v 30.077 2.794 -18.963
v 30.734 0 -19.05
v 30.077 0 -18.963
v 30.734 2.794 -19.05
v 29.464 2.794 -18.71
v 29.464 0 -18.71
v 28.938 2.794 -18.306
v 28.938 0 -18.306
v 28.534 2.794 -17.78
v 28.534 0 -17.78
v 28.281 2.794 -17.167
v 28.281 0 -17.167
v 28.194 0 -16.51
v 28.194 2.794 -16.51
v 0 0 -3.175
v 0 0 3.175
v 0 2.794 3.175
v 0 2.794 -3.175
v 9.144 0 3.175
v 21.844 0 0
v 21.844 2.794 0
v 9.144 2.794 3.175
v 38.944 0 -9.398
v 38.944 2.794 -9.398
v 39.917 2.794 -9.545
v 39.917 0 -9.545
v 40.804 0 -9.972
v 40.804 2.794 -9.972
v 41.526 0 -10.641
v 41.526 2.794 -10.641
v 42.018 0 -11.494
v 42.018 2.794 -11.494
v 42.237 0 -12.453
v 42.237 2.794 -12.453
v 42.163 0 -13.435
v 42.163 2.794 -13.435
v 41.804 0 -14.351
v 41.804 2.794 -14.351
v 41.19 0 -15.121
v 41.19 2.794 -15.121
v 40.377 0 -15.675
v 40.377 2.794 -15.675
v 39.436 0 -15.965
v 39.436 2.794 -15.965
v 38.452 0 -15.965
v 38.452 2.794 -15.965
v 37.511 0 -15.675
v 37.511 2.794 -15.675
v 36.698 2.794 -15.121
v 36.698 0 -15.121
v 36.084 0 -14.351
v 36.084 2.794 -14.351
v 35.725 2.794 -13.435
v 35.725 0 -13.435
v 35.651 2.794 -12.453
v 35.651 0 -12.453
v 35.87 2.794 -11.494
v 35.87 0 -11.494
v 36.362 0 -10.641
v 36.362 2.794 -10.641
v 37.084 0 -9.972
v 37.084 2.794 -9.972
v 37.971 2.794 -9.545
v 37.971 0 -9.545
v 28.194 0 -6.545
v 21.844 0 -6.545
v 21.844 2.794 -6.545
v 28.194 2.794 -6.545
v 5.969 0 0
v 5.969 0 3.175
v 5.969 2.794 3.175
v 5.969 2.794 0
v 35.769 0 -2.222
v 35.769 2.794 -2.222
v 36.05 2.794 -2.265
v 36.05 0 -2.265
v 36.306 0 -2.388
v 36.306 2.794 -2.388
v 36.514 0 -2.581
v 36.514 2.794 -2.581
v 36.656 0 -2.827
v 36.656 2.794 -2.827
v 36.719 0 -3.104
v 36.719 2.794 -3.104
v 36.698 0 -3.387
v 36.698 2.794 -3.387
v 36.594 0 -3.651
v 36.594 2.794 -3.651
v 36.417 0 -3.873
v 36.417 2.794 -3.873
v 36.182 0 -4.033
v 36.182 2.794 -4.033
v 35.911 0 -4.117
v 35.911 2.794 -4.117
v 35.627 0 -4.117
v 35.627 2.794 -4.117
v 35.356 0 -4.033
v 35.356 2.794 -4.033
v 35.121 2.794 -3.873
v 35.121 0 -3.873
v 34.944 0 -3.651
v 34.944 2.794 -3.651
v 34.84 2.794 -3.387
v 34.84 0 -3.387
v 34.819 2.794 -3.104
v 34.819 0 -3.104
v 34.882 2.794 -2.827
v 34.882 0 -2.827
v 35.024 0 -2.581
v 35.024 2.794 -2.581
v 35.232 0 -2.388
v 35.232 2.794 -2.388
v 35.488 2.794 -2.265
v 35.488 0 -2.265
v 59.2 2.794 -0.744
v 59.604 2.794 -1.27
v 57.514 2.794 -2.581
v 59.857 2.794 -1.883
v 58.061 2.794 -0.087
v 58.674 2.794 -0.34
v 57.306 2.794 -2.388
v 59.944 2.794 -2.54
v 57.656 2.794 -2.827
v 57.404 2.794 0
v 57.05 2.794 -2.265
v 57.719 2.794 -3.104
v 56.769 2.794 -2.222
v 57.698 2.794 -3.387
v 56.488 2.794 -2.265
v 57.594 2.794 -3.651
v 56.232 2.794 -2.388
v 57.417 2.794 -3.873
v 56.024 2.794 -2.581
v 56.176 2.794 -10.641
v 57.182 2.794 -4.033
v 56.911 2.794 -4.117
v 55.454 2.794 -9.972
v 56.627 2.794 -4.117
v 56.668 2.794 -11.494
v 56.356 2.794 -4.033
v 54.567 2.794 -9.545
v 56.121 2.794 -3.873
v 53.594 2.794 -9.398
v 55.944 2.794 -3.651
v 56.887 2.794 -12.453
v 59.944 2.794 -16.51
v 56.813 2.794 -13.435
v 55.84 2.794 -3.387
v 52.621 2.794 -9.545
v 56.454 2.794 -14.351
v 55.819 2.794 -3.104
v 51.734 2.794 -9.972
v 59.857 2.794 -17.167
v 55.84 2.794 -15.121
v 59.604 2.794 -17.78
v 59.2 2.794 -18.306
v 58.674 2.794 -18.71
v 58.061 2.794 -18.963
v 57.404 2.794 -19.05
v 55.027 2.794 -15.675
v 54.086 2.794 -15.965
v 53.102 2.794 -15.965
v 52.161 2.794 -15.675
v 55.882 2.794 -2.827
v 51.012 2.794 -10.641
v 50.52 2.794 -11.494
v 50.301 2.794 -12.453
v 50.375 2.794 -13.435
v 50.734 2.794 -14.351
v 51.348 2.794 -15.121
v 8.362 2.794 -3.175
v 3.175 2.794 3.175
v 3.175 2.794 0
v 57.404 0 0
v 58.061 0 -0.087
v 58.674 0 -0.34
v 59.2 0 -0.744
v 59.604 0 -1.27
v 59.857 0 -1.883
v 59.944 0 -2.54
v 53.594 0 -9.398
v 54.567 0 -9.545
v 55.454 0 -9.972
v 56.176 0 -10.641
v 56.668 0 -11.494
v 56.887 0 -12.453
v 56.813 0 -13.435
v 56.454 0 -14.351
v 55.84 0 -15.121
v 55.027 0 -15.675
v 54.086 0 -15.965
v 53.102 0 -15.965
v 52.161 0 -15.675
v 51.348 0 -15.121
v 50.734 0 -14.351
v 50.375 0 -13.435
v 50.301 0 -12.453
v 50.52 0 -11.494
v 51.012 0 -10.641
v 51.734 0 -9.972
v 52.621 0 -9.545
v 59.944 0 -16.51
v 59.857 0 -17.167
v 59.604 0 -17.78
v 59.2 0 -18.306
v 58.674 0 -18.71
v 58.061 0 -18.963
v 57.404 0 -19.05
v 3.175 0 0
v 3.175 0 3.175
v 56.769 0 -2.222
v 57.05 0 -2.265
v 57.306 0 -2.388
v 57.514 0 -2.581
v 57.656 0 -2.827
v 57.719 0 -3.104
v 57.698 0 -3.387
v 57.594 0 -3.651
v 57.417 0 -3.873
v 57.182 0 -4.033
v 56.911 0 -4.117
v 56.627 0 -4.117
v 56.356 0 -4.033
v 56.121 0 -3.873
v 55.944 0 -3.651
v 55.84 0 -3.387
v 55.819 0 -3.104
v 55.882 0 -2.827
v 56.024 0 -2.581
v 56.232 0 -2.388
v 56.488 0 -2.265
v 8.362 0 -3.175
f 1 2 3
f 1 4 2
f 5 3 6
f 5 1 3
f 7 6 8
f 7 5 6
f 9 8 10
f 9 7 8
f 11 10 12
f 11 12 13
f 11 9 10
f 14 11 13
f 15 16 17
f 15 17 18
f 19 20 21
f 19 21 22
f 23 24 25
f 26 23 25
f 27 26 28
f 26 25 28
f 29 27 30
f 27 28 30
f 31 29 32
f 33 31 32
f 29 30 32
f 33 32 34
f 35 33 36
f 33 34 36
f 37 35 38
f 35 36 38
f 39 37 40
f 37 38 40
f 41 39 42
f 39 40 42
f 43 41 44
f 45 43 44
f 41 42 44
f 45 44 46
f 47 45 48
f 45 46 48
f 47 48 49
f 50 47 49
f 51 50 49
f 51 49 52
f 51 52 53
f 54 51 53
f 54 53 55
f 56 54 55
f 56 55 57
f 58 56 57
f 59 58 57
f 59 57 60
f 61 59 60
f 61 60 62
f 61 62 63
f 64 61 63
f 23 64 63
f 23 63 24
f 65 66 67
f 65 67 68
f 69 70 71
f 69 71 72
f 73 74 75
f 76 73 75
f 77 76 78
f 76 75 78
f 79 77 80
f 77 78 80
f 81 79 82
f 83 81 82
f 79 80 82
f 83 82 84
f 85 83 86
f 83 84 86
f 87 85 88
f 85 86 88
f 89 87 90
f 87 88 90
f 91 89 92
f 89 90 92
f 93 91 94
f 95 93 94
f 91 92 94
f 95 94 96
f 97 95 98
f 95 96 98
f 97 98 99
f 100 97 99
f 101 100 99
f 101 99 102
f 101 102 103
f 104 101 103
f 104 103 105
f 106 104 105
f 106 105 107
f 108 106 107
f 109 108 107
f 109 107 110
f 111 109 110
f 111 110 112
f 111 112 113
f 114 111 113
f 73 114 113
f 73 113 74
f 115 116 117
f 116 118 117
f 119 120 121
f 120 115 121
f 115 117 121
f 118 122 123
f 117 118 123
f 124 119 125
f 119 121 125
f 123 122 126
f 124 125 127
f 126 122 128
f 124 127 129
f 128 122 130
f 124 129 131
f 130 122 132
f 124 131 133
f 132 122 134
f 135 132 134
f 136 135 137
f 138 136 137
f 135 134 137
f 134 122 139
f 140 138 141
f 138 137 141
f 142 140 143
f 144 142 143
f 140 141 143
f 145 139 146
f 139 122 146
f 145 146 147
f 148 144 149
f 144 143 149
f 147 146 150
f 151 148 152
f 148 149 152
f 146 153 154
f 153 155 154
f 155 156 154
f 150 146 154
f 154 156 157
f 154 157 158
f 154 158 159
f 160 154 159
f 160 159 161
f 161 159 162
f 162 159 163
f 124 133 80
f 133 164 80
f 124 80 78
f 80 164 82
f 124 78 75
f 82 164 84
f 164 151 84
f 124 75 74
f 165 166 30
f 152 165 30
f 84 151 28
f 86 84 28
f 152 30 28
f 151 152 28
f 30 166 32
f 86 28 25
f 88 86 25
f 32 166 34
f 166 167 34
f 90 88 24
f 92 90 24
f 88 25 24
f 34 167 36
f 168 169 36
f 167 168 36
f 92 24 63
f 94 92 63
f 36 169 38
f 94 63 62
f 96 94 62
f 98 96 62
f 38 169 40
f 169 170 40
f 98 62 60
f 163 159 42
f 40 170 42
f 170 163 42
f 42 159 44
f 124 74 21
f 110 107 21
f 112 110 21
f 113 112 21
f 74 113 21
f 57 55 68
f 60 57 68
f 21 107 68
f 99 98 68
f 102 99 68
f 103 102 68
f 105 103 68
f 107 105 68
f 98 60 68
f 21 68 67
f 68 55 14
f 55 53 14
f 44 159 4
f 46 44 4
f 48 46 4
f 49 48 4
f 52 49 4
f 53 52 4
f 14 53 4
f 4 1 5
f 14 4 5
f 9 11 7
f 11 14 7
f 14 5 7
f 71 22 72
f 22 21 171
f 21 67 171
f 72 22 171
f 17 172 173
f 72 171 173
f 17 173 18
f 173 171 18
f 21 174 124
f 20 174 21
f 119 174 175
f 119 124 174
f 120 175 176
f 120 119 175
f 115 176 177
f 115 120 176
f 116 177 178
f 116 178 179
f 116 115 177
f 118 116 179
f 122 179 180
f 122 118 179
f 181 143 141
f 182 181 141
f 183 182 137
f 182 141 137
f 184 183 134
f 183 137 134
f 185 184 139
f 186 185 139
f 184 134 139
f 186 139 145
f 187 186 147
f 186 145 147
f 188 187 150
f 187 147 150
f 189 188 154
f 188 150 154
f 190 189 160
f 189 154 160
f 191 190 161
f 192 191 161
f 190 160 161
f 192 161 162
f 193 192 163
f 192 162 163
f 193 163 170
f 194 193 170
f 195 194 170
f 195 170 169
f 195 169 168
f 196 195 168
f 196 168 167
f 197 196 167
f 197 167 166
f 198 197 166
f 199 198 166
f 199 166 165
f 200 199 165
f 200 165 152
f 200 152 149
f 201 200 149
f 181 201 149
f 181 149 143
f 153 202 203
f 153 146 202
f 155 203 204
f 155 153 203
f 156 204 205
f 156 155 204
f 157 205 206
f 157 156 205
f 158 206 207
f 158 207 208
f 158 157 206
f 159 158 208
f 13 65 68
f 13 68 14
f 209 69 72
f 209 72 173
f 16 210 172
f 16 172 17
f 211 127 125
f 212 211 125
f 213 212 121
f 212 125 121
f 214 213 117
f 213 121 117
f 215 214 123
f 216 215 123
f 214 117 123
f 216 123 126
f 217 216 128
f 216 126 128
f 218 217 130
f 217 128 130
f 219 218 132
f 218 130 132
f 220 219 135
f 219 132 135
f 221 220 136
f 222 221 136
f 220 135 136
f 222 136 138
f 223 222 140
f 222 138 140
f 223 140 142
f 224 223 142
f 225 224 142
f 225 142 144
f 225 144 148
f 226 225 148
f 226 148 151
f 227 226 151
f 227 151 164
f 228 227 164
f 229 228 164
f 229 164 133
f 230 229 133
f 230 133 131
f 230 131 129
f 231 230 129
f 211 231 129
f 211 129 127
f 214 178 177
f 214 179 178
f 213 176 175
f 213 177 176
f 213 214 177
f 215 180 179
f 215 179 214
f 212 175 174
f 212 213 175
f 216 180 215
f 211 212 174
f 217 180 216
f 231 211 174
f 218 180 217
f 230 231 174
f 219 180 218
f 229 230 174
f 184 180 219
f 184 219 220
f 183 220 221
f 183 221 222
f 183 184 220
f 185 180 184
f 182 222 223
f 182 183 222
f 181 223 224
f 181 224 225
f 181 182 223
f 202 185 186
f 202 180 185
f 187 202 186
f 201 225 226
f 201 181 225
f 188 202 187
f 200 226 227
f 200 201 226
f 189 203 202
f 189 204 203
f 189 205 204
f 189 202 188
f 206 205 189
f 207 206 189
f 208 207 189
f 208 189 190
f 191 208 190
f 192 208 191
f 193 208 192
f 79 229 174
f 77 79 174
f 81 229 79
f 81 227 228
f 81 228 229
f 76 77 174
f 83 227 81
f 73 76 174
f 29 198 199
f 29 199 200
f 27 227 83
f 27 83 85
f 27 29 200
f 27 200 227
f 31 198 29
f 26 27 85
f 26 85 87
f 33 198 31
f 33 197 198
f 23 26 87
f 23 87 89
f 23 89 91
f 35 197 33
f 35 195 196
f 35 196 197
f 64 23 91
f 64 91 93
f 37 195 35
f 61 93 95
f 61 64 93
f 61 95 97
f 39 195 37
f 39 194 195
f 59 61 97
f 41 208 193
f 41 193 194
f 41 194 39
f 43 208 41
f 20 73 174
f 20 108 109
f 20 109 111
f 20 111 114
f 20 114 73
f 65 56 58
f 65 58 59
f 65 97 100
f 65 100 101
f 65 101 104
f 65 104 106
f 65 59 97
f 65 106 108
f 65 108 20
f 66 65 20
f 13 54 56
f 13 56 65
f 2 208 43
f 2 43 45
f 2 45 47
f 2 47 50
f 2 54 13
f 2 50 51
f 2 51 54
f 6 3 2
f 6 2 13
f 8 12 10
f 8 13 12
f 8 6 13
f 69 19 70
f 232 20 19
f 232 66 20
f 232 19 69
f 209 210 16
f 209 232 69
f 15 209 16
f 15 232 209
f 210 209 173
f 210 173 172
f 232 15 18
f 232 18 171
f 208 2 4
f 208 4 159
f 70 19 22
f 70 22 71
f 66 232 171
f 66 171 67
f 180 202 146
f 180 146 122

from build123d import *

# Parameters (mm, degrees)
BOSS_EXTRUDE1_DEPTH = 2.794
SKETCH2_R           = 0.9525
SKETCH2_R_2         = 3.302
CUT_EXTRUDE1_DEPTH  = 63.960241994
FILLET2_R           = 2.54


with BuildPart() as part:
    # Sketch1 → Boss-Extrude1 (new body)
    with BuildSketch(Plane(origin=(0, 0, 0), x_dir=(1, 0, 0), z_dir=(0, 1, 0))):
        Polygon((59.944, 0), (21.844, 0), (9.144, -3.175), (5.969, -3.175), (5.969, 0), (3.175, 0), (3.175, -3.175), (0, -3.175), (0, 3.175), (8.362279277, 3.175), (21.844, 6.545430181), (28.194, 6.545430181), (28.194, 19.05), (59.944, 19.05), align=None)
    extrude(amount=BOSS_EXTRUDE1_DEPTH)

    # Sketch2 → Cut-Extrude1 (cut, through all)
    with BuildSketch(Plane(origin=(0, 2.794, 0), x_dir=(1, 0, 0), z_dir=(0, 1, 0))):
        with Locations((56.769, 3.175)):
            Circle(SKETCH2_R)
        with Locations((35.769, 3.175)):
            Circle(SKETCH2_R)
        with Locations((53.594, 12.7)):
            Circle(SKETCH2_R_2)
        with Locations((38.944, 12.7)):
            Circle(SKETCH2_R_2)
    extrude(amount=-CUT_EXTRUDE1_DEPTH, mode=Mode.SUBTRACT)

    # Fillet2
    fillet2_edges = [part.edges().sort_by_distance(p)[0] for p in [
        (59.944, 1.397, 0),
        (59.944, 1.397, -19.05),
        (28.194, 1.397, -19.05),
    ]]
    fillet(fillet2_edges, radius=FILLET2_R)


solid = part.part
